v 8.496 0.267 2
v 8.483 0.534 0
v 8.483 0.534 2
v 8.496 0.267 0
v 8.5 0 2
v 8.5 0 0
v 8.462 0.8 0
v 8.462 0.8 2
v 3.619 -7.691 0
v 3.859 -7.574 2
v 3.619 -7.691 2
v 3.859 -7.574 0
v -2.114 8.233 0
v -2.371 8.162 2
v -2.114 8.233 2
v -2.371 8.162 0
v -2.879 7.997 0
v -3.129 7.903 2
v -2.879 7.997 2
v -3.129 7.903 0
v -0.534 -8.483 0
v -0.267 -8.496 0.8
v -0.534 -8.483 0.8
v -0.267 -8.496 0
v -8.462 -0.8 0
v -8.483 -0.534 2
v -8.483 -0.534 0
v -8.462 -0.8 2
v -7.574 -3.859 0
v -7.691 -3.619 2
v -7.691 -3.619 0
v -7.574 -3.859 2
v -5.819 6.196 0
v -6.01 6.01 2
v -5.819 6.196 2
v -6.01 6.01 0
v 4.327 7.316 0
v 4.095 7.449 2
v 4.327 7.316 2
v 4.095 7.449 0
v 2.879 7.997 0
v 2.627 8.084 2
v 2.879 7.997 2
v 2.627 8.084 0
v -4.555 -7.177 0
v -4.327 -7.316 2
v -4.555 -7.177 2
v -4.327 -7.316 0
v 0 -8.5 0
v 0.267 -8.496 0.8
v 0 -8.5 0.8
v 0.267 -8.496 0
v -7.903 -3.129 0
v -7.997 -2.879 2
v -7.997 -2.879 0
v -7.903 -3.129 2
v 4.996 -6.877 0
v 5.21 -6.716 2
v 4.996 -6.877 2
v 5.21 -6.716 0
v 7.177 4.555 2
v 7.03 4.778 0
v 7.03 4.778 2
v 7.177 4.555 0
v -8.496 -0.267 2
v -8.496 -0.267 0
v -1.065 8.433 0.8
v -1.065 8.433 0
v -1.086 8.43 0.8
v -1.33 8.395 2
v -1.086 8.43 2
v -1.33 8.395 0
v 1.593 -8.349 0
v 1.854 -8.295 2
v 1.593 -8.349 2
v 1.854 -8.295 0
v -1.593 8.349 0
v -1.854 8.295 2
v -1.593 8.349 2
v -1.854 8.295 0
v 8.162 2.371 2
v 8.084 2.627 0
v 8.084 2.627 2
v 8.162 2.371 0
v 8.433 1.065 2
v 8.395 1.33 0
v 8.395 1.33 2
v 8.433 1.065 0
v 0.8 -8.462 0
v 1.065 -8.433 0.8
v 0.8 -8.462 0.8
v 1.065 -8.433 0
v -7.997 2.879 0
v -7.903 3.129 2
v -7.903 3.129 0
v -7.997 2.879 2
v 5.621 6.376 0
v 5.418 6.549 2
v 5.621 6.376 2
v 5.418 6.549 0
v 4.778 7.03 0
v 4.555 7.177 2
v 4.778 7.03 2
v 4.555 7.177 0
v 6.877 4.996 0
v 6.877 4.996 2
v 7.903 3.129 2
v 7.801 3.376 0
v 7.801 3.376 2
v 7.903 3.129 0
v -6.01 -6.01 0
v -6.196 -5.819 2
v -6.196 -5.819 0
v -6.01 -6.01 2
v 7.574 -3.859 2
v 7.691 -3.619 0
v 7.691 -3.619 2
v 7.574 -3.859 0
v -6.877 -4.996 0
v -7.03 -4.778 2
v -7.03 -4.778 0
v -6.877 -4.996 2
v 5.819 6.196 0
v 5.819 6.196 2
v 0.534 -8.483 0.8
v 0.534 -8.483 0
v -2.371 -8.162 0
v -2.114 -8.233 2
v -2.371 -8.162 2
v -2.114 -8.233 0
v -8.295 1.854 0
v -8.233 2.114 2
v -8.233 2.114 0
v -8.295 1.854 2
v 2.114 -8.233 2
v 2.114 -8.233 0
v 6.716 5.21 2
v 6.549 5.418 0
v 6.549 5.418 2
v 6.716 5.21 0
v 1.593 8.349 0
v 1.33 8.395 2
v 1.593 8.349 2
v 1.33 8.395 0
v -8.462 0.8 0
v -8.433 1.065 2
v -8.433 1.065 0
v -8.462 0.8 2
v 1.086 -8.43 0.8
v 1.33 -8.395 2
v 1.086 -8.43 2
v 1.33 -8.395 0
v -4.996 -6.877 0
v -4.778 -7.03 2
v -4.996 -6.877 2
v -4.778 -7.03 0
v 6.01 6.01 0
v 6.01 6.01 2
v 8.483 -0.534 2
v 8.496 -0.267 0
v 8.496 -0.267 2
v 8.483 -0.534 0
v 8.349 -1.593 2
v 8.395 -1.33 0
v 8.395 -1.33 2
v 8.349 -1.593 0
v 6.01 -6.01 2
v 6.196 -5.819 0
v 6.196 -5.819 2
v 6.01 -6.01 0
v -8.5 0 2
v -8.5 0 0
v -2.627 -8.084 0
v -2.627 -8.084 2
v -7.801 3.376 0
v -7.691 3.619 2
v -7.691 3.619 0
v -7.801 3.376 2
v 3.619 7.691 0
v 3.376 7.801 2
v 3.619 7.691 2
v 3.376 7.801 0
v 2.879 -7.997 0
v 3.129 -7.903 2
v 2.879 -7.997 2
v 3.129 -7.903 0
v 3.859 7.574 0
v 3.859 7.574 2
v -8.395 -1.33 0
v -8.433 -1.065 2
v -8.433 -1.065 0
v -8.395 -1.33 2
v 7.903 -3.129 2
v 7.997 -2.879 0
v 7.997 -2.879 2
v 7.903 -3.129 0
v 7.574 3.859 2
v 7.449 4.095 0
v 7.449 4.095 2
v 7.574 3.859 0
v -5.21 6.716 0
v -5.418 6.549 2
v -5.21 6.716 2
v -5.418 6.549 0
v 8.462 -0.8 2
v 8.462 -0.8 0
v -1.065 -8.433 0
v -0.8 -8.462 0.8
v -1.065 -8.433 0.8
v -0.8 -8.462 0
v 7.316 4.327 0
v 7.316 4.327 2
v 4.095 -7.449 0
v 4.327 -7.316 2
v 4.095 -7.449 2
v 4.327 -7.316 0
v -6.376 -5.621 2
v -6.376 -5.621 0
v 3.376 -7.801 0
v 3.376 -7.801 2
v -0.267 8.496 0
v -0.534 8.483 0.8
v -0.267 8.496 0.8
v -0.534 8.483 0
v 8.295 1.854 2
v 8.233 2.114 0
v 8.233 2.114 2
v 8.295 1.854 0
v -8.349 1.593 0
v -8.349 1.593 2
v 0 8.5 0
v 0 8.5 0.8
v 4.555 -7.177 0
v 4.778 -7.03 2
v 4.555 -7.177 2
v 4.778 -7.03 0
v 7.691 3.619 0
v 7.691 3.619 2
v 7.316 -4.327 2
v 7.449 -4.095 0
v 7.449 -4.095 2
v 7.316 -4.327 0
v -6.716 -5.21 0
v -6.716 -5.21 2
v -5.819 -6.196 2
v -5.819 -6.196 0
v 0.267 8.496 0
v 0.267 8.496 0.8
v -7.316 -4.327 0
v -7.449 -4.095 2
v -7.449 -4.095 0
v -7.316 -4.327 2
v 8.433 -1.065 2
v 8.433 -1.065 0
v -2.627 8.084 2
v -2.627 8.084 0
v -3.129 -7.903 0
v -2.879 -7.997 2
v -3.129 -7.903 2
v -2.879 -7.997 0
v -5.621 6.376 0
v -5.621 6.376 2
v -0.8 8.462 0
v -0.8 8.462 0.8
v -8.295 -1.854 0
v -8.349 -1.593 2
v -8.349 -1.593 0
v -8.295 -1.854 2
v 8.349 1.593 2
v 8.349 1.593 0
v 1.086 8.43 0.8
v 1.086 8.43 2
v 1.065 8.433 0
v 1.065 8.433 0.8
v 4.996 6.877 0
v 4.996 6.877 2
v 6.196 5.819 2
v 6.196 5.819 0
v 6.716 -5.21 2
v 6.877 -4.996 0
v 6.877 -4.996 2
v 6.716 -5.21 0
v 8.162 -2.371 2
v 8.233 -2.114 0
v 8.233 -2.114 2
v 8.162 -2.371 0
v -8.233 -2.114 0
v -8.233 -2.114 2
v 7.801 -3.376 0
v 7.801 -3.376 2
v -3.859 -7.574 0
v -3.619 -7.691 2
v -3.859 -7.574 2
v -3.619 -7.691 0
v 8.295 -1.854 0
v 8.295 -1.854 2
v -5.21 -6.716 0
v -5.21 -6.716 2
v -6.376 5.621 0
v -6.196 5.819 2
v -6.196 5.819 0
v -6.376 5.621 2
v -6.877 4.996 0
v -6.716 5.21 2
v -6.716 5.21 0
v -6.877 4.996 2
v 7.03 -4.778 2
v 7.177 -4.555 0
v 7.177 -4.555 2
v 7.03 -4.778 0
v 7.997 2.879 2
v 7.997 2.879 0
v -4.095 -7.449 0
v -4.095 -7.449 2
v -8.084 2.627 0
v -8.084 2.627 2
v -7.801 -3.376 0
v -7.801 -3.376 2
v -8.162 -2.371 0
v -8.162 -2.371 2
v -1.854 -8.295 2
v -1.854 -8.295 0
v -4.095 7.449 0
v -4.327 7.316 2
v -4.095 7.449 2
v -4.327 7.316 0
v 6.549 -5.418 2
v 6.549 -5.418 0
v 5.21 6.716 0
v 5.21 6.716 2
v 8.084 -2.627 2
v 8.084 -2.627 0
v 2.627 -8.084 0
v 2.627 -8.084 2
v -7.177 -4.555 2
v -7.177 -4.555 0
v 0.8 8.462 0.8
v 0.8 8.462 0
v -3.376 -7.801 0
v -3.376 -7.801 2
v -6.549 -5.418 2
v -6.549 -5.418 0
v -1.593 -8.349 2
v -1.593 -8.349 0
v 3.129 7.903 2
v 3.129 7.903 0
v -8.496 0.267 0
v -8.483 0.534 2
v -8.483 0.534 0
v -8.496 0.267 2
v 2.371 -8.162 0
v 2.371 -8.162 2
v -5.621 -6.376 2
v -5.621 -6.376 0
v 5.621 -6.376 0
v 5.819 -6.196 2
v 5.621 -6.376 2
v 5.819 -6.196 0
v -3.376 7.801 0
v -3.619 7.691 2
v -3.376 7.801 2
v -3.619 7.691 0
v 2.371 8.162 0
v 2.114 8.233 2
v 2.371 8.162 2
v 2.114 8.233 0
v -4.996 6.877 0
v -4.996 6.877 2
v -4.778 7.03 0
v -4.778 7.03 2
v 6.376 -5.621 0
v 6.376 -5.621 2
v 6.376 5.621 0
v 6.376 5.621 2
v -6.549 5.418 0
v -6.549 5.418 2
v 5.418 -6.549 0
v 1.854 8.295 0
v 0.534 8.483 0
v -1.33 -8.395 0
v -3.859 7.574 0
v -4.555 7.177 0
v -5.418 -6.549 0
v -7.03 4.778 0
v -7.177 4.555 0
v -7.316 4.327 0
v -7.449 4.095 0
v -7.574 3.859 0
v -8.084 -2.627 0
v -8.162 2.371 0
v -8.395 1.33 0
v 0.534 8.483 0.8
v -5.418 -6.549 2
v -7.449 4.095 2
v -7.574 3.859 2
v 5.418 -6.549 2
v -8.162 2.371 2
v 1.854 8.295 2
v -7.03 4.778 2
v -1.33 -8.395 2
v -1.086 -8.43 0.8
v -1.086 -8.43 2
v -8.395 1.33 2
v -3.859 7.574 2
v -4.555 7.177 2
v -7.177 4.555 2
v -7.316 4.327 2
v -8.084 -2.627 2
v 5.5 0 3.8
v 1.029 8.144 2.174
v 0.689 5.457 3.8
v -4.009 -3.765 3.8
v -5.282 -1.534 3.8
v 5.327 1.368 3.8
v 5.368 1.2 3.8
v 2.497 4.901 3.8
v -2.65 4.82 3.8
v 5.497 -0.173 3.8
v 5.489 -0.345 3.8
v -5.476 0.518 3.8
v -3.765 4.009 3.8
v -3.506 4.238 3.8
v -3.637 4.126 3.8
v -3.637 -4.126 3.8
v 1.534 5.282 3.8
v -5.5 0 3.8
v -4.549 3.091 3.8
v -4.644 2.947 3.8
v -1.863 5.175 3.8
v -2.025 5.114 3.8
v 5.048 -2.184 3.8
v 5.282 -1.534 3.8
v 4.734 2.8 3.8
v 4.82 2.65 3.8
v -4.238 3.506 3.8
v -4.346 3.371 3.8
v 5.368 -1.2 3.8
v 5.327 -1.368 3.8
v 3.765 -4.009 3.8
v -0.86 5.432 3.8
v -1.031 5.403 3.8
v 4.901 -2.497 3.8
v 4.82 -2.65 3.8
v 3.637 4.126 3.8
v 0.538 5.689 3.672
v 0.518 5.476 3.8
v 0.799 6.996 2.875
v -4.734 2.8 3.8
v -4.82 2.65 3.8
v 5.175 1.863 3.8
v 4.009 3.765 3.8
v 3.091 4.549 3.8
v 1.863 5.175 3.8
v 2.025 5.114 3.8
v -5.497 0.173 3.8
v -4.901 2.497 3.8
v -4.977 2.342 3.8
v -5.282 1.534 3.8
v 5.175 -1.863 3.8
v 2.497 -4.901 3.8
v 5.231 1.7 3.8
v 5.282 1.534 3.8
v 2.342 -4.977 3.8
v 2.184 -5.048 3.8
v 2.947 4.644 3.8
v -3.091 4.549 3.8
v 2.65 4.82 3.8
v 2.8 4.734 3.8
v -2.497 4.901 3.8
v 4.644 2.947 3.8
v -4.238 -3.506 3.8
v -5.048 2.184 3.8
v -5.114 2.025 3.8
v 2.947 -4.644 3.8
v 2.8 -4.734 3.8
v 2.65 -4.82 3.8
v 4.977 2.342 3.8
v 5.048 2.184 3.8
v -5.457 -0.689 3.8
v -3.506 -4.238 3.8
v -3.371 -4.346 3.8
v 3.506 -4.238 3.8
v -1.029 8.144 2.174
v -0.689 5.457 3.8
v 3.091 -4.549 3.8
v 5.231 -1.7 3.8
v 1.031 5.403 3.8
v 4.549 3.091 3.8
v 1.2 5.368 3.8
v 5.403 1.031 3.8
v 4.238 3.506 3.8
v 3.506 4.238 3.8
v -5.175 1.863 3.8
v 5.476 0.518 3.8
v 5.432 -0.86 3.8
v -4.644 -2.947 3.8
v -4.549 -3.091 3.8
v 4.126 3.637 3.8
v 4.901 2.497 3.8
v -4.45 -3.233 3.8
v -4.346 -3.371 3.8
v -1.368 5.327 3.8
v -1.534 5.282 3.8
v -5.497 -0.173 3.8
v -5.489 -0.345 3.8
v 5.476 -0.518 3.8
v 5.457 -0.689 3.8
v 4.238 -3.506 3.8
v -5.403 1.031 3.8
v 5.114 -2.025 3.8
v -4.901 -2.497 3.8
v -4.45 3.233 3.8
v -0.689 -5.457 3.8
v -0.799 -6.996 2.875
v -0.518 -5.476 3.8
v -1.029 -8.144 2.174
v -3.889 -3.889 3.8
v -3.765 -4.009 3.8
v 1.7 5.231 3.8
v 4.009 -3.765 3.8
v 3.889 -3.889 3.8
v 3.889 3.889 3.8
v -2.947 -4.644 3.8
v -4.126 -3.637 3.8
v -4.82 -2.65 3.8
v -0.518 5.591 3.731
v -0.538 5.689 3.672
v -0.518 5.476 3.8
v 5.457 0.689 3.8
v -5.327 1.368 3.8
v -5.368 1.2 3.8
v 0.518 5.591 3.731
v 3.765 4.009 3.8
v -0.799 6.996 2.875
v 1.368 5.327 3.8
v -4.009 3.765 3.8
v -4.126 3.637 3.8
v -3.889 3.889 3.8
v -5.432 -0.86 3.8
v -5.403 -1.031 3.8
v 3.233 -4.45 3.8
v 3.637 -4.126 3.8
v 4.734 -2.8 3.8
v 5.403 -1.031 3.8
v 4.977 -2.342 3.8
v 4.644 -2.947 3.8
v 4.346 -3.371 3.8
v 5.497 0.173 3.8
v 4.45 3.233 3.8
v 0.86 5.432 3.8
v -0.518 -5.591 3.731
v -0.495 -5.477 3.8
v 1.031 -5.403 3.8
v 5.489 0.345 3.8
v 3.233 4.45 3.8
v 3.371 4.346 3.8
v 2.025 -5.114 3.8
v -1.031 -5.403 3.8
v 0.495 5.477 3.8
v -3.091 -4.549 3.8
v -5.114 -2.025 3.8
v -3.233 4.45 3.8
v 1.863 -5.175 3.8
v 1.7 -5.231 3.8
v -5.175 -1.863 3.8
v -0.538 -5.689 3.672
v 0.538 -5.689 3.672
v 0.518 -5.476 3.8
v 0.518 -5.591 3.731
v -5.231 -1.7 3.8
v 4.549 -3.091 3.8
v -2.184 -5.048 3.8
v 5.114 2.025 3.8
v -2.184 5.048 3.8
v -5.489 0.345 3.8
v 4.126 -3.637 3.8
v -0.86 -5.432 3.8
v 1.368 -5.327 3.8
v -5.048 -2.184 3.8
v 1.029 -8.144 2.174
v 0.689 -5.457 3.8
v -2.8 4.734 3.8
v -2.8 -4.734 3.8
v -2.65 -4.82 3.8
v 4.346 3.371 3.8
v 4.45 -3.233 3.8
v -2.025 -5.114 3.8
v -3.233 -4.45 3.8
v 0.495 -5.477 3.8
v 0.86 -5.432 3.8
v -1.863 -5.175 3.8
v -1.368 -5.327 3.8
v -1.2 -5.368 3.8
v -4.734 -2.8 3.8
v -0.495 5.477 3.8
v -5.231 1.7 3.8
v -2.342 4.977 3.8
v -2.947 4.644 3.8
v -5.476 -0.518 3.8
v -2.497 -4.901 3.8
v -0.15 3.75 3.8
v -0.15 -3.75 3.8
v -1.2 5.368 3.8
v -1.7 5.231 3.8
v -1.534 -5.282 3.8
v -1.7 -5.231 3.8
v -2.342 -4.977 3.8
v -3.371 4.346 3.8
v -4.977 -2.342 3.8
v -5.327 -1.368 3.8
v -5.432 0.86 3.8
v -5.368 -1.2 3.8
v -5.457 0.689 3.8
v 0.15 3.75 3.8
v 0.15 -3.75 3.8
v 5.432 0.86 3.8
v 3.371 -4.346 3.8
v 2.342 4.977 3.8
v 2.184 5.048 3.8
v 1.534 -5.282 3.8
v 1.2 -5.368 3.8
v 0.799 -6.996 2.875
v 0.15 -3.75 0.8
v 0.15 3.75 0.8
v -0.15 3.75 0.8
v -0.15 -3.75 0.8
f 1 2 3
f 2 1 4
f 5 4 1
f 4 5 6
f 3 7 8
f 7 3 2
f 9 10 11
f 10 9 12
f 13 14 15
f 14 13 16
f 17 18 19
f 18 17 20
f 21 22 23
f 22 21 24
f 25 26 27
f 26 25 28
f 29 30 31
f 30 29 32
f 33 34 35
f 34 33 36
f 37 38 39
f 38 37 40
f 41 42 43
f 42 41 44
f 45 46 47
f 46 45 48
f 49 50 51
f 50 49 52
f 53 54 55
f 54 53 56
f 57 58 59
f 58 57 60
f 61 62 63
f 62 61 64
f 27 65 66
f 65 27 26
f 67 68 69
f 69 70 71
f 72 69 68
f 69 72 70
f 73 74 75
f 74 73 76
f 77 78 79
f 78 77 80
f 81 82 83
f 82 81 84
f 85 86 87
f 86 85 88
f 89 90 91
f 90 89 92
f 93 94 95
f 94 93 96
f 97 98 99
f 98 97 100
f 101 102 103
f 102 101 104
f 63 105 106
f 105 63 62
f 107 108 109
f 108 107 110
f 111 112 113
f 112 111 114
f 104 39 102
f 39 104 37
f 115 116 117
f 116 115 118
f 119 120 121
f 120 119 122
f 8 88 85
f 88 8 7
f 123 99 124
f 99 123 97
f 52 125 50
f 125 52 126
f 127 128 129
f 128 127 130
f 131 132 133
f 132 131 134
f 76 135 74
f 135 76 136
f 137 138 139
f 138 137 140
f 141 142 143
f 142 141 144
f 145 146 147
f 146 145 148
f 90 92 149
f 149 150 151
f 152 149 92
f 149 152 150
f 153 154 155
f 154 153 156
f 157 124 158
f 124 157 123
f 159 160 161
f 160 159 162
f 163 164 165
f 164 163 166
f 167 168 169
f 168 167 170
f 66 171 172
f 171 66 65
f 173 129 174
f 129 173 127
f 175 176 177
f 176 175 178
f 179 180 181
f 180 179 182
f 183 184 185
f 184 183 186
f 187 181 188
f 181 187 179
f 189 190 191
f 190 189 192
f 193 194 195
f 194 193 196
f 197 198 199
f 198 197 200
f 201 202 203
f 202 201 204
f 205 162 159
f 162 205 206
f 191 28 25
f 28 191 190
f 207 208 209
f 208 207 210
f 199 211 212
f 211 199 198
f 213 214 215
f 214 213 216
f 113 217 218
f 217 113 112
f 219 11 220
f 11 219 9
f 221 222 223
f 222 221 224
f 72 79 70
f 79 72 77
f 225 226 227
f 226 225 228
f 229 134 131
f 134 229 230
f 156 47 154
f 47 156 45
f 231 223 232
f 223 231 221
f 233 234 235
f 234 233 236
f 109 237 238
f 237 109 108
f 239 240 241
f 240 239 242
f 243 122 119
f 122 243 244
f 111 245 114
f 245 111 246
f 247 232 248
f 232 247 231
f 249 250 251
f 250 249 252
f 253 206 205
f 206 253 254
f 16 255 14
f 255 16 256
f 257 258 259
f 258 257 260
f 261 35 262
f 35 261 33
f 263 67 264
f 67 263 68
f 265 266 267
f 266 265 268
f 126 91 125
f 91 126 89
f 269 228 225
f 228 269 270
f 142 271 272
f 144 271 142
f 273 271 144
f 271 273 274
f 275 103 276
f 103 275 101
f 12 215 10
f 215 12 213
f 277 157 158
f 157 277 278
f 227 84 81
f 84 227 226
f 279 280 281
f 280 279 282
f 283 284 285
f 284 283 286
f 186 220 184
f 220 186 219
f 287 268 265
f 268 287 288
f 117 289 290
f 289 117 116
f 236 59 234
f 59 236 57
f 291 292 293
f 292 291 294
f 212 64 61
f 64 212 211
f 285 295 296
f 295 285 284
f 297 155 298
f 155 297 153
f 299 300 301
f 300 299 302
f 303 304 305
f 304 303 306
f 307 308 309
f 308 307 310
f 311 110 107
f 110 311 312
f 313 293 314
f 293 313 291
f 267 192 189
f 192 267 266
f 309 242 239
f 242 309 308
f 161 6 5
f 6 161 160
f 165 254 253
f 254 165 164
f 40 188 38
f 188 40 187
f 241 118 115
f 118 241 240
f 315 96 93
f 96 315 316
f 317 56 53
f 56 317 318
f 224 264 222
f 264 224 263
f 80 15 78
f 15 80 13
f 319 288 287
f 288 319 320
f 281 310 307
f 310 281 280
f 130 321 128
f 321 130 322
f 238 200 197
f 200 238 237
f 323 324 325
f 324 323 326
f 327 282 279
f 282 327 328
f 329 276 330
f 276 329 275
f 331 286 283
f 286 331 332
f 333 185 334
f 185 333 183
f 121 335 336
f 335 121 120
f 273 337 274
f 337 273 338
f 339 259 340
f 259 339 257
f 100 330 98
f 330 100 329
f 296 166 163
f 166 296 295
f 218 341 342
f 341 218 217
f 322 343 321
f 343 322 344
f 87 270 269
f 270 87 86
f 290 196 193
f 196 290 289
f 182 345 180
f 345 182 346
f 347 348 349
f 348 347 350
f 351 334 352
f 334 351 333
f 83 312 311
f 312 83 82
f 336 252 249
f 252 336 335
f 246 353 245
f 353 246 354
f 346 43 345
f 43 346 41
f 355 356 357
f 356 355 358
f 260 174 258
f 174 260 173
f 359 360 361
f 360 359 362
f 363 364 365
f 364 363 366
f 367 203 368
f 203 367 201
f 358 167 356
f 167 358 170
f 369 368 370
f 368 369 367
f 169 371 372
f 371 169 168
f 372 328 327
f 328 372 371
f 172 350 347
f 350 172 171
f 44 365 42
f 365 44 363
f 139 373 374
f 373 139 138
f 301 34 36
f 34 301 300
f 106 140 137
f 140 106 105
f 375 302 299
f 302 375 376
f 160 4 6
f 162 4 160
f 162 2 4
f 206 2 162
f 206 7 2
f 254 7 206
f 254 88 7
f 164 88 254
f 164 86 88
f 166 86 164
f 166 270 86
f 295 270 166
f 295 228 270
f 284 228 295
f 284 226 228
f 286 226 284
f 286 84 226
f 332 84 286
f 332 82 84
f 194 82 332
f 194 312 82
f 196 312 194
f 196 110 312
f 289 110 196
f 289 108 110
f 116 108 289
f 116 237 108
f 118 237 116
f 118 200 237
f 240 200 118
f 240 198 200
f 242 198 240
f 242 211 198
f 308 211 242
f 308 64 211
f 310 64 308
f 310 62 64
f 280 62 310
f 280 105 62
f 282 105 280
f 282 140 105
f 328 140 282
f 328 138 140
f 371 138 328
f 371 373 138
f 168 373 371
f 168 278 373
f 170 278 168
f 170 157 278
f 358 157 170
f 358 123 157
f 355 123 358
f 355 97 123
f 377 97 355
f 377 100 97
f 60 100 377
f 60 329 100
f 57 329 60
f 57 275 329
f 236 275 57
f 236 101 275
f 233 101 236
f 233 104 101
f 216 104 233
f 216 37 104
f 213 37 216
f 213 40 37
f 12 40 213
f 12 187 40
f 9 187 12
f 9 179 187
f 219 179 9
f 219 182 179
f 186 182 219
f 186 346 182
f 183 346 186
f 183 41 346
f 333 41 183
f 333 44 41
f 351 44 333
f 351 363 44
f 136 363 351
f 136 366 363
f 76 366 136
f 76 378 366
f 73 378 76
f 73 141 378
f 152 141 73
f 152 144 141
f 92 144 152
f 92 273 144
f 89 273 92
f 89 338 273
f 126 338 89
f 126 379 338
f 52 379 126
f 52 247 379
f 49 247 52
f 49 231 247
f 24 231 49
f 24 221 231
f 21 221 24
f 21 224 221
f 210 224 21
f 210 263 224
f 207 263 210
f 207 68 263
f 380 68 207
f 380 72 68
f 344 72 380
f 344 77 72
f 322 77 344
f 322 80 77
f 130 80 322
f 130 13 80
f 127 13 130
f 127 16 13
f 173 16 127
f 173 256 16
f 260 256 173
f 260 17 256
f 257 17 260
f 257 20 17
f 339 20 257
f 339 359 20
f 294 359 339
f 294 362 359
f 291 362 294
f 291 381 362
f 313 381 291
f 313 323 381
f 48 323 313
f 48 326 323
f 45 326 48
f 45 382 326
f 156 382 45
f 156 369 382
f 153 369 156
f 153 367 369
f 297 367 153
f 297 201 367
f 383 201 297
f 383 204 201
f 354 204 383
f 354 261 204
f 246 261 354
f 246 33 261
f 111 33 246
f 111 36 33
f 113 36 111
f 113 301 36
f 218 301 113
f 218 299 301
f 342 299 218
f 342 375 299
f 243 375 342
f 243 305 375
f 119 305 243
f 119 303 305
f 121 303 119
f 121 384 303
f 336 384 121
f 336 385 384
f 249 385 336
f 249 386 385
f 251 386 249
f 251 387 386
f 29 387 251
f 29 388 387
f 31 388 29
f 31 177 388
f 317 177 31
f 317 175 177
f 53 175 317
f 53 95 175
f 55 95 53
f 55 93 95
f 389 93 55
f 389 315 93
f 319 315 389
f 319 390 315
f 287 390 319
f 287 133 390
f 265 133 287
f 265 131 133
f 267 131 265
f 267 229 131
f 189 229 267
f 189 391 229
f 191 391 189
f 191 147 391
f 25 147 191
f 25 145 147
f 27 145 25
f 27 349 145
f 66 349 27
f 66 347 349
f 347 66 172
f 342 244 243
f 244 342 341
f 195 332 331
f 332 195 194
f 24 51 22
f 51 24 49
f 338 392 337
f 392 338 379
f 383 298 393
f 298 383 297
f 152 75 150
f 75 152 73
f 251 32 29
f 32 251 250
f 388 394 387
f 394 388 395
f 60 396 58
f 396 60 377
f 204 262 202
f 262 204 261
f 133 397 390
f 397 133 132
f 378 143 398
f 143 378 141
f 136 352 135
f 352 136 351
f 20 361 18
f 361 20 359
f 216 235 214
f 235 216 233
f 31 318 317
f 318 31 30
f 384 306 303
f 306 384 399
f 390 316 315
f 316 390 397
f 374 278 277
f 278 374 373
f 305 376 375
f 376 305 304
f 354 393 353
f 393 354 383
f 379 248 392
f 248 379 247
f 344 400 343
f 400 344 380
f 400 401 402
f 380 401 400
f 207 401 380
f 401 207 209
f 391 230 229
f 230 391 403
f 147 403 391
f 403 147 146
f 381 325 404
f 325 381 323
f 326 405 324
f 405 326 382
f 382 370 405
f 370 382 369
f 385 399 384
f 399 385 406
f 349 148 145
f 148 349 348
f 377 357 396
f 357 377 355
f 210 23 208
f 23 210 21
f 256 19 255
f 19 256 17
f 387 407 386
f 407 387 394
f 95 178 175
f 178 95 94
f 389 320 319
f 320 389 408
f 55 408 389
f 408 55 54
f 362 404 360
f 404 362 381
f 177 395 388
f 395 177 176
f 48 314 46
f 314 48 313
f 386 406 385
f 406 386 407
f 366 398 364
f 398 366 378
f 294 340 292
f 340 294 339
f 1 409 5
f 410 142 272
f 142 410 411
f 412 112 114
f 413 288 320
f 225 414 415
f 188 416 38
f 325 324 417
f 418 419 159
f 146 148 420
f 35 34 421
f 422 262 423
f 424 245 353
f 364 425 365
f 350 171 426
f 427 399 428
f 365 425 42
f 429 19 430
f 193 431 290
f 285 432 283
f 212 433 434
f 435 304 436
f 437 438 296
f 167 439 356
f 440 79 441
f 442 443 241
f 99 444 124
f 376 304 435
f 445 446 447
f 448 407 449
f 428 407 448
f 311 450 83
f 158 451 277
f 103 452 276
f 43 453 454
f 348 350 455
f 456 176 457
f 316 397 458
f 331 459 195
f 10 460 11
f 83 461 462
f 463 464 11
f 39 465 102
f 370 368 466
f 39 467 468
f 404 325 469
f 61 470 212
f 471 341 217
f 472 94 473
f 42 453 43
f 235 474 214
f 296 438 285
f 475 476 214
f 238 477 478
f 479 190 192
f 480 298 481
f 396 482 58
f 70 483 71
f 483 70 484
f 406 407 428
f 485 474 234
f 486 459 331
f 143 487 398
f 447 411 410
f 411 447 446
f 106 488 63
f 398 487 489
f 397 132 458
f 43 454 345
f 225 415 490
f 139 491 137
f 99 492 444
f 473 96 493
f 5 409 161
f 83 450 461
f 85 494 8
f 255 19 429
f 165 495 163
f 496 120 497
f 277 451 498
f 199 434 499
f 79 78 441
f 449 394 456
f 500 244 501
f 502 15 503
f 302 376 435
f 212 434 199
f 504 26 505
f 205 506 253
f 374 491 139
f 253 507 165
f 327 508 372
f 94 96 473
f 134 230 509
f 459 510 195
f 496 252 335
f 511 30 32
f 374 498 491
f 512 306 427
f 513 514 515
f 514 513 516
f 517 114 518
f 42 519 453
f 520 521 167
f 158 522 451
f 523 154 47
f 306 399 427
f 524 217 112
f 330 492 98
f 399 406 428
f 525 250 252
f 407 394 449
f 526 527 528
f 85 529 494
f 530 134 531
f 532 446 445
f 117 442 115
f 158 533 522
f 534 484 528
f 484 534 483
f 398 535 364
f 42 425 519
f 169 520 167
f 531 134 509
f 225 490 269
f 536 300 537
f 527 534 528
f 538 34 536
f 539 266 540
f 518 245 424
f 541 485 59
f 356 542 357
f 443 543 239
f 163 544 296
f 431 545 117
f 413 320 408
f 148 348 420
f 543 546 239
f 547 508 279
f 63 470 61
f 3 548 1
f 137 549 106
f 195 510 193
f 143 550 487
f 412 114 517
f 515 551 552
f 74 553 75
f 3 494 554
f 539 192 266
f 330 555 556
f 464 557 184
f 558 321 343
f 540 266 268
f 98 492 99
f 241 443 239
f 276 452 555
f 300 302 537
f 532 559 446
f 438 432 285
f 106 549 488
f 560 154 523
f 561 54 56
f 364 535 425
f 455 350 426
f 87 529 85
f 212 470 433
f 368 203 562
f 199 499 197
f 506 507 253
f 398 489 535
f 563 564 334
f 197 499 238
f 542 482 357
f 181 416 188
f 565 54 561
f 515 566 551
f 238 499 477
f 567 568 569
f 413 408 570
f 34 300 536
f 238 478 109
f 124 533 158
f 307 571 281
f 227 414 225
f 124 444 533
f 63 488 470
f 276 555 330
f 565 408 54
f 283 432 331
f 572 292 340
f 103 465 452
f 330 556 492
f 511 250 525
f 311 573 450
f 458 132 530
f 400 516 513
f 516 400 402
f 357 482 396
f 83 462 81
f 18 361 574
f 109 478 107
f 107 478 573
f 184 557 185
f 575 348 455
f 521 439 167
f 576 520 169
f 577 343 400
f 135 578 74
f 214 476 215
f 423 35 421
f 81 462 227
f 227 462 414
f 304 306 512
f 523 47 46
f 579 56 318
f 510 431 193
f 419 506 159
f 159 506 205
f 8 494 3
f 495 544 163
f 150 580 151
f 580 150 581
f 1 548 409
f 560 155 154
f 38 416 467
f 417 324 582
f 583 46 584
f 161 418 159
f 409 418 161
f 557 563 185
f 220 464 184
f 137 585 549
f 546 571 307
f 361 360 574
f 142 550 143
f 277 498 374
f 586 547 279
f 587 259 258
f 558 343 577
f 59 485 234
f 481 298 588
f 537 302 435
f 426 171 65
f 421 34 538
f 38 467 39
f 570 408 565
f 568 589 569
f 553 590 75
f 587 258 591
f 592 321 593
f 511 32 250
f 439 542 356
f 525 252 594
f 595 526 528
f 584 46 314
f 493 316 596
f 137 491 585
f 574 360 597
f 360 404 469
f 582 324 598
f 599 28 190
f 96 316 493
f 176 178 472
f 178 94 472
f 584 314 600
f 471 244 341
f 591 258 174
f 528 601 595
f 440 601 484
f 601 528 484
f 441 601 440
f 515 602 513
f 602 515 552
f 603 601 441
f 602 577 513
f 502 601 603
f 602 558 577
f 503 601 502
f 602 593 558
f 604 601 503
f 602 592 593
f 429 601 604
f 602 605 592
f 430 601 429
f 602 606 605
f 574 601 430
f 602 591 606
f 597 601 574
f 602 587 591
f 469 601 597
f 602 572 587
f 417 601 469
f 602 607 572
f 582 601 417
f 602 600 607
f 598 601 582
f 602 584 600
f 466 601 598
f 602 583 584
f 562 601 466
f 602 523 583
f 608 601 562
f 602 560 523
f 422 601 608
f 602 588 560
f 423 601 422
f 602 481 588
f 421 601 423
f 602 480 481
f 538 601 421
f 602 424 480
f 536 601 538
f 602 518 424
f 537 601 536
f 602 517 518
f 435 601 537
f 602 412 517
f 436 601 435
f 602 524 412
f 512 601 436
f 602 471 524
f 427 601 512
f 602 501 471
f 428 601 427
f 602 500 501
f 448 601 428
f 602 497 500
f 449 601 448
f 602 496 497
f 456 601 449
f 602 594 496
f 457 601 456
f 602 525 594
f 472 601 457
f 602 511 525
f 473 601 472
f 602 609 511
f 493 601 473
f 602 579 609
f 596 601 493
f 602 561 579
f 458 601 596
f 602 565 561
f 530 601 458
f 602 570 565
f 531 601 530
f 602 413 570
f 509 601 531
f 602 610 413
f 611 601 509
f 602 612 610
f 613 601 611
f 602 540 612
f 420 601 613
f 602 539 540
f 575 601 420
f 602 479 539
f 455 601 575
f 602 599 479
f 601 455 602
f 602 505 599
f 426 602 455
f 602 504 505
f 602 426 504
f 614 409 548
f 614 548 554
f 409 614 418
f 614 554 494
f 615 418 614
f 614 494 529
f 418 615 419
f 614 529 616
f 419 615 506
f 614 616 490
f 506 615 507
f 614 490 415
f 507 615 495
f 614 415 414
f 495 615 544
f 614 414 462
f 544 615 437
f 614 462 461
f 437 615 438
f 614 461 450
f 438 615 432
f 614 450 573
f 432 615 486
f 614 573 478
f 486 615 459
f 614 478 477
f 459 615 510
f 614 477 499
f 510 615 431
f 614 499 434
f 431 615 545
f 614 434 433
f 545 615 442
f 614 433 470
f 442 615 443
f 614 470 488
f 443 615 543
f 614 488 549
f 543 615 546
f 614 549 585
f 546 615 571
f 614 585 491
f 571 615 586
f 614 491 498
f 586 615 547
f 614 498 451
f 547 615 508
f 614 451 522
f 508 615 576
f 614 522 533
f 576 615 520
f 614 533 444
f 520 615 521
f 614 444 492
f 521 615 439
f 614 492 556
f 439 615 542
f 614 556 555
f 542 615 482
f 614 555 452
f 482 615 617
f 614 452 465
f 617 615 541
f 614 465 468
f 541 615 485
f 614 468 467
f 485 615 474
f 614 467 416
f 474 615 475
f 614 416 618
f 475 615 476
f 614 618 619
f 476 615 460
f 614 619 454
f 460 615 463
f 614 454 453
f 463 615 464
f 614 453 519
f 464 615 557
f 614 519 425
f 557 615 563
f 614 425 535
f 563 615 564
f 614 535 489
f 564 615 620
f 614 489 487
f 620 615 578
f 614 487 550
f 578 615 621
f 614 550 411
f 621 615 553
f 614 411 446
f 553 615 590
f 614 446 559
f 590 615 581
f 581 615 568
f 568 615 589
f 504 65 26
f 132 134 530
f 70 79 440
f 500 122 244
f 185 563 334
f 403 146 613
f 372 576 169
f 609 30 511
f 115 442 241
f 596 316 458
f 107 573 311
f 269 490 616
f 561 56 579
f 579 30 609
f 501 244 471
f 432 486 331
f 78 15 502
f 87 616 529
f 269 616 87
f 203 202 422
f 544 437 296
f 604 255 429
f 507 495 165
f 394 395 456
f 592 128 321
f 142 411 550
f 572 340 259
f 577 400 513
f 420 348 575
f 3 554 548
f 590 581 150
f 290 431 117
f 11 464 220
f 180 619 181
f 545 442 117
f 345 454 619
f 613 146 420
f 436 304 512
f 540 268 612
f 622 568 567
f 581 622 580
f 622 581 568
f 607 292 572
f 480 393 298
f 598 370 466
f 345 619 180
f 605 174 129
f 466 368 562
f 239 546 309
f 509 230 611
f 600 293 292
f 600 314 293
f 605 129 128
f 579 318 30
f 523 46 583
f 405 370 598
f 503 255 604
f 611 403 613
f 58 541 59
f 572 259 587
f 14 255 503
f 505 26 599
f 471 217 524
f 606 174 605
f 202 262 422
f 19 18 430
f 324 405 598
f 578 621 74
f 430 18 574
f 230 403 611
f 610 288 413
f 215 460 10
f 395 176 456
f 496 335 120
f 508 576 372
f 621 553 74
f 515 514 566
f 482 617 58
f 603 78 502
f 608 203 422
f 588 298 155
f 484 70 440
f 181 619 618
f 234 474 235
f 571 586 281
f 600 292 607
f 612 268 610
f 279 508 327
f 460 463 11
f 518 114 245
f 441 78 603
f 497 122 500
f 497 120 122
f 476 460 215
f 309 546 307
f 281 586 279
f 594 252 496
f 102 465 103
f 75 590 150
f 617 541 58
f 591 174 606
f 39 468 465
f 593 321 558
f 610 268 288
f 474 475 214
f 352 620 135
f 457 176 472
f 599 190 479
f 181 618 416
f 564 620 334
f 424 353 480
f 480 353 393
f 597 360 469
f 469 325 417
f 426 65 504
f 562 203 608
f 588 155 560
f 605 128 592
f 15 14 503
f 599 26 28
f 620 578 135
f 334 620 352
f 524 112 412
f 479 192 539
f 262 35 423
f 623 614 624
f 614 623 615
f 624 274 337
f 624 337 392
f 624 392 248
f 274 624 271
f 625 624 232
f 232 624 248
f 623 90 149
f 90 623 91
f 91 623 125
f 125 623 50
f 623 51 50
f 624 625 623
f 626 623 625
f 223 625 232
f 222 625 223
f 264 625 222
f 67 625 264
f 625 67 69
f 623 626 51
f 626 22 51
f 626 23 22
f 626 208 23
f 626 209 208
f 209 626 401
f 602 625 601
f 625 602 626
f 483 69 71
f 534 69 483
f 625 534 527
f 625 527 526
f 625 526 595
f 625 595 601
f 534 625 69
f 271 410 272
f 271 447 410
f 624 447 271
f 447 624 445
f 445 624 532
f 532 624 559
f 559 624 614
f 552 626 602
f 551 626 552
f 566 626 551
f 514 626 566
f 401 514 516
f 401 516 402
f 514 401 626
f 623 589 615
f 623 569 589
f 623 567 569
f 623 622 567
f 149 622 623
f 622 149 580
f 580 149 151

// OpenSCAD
// card holder by ribaldos@thingiverse
// 25.11.2017

// USER PARAMETERS

// diameter
d = 17;

// total height
h = 3.8;

// width of slit holding cards or sheets
w_slit = 0.3;  

// depth of slit
z_slit = 3;

// length of card clamping of slit
l_clamp = 6;        

// height of cylindric foot
h_foot = 2;     

// diameter of top (evolves cylindrically to the top)
d_top = 11;

// width of both slot openings
w_opening = 2.2;    

//d_foot = 17;    // diameter of foot (non-cylindric bottom part)


// INTERNAL

h_top = h - h_foot; // height of top
h_slit = h - z_slit; // starting height of slit from floor 

$fn = 200;

module opening()
{
  linear_extrude(40)
    polygon([[0, l_clamp/2], [w_opening/2, d/2], [-w_opening/2, d/2]]);
}

difference()
{
  union()
  {
    cylinder(h_foot, d=d, false);
    translate([0, 0, h_foot]) cylinder(h_top, d1=d, d2=d_top, false);
  }
  
  translate([-w_slit/2, -d/2, h_slit]) cube([w_slit, d, 40], false);

  translate([0, 0, h_slit]) opening();
  mirror([0, -1, 0]) translate([0, 0, h_slit]) opening();

}
